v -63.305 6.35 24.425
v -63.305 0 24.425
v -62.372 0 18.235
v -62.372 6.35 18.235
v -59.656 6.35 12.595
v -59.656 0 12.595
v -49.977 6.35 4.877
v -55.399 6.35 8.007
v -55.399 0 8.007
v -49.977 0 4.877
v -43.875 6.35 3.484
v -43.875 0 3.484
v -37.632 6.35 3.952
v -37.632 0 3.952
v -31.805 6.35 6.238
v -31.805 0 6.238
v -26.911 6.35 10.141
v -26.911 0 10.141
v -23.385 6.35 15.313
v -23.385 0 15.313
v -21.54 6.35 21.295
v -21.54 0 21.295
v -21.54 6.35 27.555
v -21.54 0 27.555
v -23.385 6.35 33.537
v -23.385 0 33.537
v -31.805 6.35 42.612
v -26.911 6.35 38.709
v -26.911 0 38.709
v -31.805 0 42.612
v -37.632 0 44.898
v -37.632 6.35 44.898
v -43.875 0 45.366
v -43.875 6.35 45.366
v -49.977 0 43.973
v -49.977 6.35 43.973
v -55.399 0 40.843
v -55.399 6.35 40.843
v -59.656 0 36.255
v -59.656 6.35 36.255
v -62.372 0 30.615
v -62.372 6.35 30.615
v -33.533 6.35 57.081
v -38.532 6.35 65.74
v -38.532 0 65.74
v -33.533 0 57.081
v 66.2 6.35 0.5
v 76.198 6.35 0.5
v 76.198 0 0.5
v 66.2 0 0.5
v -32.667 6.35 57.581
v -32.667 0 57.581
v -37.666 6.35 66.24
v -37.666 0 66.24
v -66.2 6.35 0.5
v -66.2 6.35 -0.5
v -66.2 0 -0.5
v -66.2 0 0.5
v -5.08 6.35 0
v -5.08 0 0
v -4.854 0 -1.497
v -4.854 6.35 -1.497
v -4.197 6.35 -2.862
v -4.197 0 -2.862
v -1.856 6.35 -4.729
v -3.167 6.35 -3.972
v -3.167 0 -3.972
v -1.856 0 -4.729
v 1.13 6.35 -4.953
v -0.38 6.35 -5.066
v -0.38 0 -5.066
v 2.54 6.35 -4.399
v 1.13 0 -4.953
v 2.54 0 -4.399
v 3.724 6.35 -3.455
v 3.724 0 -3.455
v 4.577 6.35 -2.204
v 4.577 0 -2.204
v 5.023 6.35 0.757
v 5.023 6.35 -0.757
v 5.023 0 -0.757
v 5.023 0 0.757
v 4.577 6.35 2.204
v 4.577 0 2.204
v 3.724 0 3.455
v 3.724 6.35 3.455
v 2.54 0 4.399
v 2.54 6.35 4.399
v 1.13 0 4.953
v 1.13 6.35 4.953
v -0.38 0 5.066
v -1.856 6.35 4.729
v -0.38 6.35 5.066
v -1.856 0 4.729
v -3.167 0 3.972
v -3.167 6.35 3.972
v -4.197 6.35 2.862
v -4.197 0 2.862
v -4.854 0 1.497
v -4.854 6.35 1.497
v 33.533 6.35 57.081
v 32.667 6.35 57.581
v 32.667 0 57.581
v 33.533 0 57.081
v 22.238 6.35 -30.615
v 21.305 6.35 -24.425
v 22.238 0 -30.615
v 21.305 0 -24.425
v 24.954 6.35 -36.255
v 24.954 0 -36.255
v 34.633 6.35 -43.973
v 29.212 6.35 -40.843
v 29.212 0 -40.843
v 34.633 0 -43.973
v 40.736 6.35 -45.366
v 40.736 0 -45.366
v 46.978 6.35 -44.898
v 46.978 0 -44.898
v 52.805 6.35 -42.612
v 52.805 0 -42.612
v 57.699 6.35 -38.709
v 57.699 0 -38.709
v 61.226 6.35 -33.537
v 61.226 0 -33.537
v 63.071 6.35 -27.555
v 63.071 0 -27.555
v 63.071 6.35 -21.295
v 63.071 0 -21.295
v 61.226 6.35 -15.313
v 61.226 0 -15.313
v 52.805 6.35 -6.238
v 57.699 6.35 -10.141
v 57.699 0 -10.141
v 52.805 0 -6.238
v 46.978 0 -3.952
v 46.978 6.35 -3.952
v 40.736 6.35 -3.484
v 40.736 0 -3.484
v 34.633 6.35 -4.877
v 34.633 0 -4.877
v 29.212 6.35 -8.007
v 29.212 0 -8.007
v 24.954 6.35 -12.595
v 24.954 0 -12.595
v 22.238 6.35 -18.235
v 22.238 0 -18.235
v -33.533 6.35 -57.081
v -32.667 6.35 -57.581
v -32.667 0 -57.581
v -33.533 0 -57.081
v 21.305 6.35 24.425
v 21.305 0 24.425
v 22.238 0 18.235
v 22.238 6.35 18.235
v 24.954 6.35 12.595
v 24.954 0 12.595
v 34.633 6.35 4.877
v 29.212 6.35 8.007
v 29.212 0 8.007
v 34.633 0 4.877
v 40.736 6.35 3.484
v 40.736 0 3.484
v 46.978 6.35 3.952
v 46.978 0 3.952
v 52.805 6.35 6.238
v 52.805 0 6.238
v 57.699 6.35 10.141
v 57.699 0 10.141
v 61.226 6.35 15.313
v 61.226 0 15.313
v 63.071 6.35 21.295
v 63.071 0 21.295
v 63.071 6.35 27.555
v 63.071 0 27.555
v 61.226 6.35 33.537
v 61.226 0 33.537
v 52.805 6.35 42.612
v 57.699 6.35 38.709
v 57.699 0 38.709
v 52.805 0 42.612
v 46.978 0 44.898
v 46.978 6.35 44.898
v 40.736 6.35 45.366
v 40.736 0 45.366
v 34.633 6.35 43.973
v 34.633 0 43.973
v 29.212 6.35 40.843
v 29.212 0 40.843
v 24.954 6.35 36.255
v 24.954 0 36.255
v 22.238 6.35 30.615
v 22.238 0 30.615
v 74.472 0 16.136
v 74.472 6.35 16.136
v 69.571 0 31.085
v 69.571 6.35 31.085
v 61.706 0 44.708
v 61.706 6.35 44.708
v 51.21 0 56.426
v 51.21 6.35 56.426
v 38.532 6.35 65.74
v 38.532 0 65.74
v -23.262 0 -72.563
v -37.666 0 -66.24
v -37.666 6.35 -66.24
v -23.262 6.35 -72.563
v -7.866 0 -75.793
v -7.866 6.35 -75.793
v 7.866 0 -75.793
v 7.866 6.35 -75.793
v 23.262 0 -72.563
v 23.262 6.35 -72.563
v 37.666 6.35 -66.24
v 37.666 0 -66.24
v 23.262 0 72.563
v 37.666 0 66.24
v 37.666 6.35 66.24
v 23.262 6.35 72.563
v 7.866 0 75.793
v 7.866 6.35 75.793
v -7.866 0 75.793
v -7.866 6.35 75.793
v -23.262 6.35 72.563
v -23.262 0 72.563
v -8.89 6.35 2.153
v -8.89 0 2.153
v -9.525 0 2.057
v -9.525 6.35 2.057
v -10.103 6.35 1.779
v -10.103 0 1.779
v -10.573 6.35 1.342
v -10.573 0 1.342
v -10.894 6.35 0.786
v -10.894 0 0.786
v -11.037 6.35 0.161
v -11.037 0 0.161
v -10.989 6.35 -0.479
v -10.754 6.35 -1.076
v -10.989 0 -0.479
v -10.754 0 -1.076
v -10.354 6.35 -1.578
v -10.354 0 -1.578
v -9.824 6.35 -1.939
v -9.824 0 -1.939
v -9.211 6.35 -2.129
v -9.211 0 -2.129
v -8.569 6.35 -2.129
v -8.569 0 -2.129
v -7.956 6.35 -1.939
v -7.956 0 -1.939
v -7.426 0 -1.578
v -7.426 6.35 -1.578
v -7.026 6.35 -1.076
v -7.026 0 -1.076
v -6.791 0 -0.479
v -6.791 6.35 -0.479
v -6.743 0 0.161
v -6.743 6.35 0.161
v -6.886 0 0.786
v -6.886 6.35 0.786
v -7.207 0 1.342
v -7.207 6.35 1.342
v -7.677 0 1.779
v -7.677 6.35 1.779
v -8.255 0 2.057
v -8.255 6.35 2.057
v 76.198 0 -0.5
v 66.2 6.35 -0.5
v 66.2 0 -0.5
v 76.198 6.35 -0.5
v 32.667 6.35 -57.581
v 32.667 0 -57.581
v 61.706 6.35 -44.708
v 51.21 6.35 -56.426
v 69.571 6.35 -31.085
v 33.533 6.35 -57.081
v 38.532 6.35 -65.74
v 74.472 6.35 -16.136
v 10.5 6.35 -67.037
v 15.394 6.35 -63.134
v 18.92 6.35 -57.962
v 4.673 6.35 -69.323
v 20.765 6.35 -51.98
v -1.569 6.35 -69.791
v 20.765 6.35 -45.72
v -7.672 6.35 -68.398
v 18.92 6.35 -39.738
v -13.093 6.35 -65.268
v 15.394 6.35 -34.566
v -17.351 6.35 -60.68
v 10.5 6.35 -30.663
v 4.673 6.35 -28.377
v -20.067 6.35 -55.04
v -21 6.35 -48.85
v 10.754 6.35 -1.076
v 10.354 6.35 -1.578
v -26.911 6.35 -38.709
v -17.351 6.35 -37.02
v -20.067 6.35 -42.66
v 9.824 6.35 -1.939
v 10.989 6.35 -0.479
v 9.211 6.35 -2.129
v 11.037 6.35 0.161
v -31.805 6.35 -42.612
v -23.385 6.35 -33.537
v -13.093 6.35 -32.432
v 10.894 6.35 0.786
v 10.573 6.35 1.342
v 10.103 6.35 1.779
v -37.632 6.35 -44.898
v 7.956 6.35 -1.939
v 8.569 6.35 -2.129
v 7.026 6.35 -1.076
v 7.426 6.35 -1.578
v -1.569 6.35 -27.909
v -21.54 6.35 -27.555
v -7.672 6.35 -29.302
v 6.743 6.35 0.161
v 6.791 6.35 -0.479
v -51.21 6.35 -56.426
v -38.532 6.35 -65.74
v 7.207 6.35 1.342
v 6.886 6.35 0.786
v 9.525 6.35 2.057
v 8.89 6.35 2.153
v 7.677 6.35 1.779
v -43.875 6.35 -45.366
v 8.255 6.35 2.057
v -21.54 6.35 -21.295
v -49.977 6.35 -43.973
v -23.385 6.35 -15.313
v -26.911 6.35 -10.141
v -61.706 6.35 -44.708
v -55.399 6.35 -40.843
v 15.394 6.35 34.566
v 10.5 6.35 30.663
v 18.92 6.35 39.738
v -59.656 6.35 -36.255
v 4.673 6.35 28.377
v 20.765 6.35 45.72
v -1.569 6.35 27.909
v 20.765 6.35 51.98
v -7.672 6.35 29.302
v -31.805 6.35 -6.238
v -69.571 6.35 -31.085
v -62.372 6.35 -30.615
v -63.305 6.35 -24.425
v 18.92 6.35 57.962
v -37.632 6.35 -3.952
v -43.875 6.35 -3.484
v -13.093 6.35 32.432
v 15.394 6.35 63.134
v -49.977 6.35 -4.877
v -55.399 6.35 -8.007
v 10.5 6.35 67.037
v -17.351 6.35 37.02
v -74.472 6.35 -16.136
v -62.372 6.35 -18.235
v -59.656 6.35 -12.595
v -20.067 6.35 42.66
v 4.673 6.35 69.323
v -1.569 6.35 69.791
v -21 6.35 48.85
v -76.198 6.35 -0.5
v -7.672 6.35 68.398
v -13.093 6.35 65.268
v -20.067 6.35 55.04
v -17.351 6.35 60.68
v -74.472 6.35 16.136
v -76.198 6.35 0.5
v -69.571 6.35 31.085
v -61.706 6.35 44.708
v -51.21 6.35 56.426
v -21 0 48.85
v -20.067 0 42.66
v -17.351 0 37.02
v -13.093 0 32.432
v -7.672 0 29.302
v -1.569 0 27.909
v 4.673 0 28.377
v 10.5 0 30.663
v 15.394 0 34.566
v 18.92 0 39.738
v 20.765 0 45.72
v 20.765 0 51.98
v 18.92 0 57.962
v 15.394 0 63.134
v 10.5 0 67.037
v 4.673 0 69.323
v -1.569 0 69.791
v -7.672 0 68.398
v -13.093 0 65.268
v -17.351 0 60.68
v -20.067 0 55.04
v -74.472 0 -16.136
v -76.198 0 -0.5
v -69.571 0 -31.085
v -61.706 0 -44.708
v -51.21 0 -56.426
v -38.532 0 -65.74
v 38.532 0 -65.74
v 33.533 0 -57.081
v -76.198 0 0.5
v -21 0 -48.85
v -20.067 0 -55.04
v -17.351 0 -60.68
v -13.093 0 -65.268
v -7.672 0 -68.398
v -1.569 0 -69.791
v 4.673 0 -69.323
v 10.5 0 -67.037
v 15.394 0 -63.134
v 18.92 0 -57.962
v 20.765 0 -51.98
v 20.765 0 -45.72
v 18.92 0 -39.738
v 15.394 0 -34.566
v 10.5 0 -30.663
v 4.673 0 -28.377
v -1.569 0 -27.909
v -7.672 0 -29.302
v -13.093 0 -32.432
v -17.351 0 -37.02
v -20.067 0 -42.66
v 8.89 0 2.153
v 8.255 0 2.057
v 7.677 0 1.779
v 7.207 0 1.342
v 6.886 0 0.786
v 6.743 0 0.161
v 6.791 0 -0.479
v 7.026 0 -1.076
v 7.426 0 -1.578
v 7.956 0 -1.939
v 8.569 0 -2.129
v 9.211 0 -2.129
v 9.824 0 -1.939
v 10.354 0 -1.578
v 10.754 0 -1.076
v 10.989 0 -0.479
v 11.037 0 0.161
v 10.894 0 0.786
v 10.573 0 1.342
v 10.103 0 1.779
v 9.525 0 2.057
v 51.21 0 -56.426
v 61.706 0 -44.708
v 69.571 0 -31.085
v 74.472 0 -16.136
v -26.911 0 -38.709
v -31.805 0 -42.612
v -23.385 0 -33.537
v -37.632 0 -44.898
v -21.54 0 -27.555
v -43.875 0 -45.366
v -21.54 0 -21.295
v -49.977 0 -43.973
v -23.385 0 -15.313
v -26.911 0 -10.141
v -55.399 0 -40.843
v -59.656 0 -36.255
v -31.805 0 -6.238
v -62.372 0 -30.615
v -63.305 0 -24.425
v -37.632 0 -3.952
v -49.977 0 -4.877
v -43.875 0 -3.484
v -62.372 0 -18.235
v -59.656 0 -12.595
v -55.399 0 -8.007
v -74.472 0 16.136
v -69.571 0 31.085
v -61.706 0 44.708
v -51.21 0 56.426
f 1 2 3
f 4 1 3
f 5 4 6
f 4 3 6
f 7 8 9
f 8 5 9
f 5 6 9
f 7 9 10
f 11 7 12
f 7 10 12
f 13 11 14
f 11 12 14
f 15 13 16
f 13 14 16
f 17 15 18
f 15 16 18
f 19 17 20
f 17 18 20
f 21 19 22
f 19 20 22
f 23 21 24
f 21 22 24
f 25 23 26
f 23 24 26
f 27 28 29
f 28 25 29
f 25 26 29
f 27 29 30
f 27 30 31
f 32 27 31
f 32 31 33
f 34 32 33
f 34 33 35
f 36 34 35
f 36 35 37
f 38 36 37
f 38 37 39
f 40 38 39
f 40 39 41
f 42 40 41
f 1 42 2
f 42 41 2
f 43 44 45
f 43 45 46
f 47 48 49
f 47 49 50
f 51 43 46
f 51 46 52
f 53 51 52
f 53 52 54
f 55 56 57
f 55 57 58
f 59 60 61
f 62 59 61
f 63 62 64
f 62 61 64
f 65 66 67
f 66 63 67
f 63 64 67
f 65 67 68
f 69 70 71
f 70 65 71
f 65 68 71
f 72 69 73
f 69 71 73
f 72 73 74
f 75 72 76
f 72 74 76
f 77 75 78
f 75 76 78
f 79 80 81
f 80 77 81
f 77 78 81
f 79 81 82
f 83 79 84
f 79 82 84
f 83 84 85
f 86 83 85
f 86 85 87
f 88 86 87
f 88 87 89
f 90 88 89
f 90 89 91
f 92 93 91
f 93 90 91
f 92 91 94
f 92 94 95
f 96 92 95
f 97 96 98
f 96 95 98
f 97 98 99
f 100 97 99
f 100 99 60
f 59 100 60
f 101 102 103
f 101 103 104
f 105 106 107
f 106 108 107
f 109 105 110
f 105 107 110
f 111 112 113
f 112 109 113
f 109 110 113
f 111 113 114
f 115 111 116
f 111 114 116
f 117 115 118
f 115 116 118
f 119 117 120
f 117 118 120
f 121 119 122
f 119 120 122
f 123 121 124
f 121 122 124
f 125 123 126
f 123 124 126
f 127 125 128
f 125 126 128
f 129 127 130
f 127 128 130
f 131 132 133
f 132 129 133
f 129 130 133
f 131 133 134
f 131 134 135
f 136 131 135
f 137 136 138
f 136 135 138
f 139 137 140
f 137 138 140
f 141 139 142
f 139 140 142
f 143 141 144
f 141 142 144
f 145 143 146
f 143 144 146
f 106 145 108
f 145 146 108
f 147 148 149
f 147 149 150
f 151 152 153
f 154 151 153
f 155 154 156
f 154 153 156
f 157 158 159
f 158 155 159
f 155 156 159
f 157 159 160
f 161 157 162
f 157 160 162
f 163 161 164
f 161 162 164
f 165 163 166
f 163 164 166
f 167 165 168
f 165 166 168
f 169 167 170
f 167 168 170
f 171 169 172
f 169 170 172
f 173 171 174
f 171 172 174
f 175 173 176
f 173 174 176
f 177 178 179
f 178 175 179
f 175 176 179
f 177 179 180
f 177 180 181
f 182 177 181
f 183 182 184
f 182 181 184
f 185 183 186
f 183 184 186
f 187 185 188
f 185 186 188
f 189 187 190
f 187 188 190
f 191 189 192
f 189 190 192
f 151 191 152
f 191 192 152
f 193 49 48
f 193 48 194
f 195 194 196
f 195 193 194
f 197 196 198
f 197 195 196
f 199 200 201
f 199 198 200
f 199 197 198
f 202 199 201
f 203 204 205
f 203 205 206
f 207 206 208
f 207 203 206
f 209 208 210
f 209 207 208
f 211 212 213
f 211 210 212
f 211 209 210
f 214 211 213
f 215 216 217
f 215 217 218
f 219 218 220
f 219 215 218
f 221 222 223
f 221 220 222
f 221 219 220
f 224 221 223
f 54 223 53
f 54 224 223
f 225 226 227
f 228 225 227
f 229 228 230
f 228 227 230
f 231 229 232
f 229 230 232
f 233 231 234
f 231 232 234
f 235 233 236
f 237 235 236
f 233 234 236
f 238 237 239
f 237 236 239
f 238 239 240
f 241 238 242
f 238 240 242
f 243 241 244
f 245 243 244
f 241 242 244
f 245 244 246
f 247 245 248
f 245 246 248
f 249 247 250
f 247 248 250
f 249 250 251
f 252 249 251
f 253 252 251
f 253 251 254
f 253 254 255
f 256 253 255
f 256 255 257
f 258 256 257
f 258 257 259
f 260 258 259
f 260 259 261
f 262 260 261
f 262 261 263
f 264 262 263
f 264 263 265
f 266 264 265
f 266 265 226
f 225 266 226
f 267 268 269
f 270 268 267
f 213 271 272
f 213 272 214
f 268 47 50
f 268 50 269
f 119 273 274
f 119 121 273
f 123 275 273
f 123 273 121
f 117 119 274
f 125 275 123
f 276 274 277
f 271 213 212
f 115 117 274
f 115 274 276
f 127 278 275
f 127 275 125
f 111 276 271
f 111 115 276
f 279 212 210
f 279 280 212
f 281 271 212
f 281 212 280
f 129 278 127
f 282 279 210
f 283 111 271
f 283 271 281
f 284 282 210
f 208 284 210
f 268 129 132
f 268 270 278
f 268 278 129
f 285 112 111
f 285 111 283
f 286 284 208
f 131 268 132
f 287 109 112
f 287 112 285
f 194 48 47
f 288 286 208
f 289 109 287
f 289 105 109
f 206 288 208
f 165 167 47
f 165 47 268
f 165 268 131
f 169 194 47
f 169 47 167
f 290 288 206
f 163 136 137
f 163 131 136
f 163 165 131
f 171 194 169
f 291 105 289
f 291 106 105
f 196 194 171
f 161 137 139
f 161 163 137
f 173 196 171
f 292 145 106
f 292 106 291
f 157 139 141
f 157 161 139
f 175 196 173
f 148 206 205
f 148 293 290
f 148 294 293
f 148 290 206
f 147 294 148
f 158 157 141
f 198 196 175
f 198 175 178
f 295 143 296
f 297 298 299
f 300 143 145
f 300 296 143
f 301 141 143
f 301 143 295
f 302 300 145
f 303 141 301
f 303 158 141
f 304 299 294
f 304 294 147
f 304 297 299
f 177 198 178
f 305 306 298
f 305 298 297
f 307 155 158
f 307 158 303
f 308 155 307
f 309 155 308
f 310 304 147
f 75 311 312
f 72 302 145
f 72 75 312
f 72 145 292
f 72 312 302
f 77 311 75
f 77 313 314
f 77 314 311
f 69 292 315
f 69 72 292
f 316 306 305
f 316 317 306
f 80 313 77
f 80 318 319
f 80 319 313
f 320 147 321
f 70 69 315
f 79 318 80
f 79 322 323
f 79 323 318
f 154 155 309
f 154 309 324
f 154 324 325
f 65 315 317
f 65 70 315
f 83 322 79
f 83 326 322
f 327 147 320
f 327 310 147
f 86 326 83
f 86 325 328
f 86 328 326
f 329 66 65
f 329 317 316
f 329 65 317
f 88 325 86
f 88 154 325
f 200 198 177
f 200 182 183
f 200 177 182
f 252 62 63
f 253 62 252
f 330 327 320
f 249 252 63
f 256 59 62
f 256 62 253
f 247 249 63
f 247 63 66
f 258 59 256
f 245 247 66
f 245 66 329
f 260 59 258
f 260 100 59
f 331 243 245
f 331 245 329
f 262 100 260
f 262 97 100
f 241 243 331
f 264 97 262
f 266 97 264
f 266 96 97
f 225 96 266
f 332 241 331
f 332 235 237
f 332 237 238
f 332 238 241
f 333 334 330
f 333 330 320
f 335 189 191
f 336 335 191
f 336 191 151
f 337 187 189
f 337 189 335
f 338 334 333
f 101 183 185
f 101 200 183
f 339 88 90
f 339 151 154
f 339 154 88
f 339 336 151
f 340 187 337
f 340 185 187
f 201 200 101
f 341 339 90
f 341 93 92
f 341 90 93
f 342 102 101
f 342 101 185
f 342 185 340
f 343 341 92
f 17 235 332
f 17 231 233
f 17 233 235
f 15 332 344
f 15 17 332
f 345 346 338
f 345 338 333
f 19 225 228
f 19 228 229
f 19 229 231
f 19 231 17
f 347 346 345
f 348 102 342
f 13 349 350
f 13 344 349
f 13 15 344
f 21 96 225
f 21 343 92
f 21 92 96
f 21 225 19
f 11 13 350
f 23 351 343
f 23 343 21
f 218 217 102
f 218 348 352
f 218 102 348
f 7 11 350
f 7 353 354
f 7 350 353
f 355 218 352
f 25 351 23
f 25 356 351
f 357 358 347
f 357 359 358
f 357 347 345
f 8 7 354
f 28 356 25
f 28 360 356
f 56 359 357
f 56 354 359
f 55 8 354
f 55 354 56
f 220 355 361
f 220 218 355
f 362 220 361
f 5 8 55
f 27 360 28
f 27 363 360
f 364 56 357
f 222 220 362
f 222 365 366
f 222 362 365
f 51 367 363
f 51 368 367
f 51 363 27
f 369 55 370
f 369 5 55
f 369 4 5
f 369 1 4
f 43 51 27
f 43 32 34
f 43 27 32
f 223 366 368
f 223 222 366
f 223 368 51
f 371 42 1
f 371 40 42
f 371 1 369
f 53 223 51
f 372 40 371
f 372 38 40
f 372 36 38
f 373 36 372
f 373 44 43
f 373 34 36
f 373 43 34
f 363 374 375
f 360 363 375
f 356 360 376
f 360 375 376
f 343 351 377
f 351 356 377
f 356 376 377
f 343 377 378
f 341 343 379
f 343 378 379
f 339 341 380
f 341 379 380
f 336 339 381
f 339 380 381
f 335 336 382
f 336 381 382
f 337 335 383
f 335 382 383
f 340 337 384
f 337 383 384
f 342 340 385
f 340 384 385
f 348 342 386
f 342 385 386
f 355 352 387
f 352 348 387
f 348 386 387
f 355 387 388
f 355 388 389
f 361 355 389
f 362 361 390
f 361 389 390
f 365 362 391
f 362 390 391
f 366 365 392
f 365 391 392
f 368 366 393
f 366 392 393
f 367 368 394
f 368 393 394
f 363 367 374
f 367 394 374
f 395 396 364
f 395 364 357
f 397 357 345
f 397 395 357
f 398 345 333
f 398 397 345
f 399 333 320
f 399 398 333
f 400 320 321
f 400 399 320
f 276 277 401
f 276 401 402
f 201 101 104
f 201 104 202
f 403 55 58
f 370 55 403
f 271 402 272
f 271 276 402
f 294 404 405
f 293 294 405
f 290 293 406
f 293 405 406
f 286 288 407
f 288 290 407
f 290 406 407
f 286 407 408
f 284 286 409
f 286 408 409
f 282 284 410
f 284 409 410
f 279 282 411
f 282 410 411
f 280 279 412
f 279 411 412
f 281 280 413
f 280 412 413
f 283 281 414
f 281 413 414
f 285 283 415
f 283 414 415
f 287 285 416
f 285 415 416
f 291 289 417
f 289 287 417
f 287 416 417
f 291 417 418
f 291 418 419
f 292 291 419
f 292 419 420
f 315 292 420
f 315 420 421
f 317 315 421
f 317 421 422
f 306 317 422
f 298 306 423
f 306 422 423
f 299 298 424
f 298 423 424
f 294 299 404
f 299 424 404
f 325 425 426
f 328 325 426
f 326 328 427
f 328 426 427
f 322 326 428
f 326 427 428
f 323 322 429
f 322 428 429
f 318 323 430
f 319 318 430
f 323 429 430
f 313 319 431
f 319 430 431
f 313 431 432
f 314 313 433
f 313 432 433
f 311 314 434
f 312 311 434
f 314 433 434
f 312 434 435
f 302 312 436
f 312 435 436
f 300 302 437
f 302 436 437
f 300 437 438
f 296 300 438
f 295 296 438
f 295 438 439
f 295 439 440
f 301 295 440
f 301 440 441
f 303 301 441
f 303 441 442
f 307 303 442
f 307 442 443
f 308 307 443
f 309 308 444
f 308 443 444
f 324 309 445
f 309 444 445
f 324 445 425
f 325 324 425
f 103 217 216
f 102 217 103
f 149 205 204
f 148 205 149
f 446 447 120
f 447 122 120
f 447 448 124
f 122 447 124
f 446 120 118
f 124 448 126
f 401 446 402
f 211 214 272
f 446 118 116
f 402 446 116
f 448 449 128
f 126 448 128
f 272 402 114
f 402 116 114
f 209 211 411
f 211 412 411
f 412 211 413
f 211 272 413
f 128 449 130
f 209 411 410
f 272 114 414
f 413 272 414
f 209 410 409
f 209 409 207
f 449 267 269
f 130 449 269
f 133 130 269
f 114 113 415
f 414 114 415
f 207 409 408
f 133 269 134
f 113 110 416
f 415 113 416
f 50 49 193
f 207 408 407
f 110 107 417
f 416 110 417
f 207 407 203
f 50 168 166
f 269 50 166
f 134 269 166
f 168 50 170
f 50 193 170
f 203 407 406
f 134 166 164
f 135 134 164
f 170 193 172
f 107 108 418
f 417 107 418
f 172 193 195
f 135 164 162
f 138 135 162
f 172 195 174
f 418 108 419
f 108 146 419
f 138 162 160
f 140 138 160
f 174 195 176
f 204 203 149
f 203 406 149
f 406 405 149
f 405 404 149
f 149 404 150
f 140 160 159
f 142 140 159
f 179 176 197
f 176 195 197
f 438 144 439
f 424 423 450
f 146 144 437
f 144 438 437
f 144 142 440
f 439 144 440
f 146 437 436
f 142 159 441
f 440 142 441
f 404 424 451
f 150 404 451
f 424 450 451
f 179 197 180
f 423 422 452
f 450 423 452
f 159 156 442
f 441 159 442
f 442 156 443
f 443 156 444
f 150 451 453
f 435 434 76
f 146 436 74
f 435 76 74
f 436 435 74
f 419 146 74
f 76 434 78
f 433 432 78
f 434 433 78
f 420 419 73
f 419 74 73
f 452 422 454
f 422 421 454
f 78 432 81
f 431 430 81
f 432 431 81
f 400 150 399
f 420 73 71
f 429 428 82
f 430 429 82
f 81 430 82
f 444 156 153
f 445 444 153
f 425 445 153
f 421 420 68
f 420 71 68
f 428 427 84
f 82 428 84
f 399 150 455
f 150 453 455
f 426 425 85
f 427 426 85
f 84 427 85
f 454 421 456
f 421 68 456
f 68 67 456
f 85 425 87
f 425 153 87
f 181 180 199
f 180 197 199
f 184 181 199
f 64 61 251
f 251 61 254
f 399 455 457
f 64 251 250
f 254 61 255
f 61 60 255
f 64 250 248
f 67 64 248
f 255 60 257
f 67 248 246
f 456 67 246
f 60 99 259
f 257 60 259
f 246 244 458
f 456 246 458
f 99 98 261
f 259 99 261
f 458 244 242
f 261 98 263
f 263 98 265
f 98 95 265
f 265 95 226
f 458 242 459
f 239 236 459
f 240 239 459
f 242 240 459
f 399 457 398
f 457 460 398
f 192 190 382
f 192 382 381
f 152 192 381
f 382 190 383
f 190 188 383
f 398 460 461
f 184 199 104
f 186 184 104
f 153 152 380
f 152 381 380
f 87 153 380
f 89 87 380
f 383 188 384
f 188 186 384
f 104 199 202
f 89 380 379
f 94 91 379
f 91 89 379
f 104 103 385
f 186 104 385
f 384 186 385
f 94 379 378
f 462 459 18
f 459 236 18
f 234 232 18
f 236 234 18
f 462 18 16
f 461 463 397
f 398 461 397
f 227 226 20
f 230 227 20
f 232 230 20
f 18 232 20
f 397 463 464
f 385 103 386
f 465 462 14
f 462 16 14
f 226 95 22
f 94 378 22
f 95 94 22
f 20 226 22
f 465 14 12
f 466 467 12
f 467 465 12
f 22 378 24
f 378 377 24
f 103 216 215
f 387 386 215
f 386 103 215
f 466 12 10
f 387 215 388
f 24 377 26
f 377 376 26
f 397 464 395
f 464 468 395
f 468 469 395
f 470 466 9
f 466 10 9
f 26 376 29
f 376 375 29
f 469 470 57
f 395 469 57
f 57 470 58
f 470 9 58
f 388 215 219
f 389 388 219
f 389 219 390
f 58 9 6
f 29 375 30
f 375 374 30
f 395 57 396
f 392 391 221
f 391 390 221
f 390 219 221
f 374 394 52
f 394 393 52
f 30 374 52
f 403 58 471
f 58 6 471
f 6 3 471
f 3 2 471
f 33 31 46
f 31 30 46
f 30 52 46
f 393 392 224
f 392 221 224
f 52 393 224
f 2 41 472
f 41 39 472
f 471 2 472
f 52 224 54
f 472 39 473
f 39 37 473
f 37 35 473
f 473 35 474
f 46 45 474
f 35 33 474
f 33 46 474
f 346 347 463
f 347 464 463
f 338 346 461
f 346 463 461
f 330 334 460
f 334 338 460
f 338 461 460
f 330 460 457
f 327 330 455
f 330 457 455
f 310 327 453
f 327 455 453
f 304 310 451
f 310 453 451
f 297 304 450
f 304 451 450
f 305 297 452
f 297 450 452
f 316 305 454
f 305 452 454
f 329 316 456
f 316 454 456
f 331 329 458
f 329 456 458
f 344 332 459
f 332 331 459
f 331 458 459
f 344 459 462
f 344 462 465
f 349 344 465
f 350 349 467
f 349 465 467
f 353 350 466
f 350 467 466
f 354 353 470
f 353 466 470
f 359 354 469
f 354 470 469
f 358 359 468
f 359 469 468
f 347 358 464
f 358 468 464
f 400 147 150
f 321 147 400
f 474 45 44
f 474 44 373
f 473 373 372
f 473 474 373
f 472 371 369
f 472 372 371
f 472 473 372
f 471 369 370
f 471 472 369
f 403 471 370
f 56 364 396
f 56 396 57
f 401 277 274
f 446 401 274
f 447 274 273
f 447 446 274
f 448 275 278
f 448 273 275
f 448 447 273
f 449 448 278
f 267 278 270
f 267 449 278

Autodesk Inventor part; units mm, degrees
ref_plane "YZ Plane" through (0, 0, 0) normal (1, 0, 0) x (0, 1, 0)
ref_plane "XZ Plane" through (0, 0, 0) normal (0, 1, 0) x (-1, 0, 0)
ref_plane "XY Plane" through (0, 0, 0) normal (0, 0, 1) x (1, 0, 0)
sketch "Sketch1" plane through (0, 0, 0) normal (0, 1, 0) x (-1, 0, 0)
  circle A0 centre (0, -48.85) radius 21
  line L0 (0, -48.85) -> (0, 0) construction
  circle A1 centre (42.3053, -24.425) radius 21
  circle A2 centre (42.3053, 24.425) radius 21
  circle A3 centre (0, 48.85) radius 21
  circle A4 centre (-42.3053, 24.425) radius 21
  circle A5 centre (-42.3053, -24.425) radius 21
  circle A6 centre (0, 0) radius 76.2
  circle A7 centre (0, 0) radius 5.08
  dimension "d0" = 42
  dimension "d2" = 48.85
  dimension "d5" = 360
  dimension "d7" = 152.4
  dimension "d8" = 10.16
extrude "Extrusion1" add sketch "Sketch1" along normal blind 6.35
sketch "Sketch2" plane through (0, 6.35, 0) normal (0, 1, 0) x (1, 0, 0)
  circle A0 centre (0, 0) radius 5.08 projected
  line L0 (-8.89, 0) -> (8.89, 0) construction
  dimension "d11" = 17.78
hole "Hole1" at (-8.89, 6.35, 0) at (8.89, 6.35, 0) direction (0, -1, 0) diameter 4.3053 end through all
sketch "Sketch3" plane through (0, 6.35, 0) normal (0, 1, 0) x (1, 0, 0)
  circle A0 centre (-8.89, 0) radius 2.1526 projected
  circle A1 centre (0, 0) radius 5.08 projected
  circle A2 centre (0, 0) radius 76.2 projected
  line L0 (-32.667, 57.5809) -> (-33.533, 57.0809)
  line L1 (-33.533, 57.0809) -> (-39.803, 67.9408)
  line L2 (-39.803, 67.9408) -> (-38.937, 68.4408)
  line L3 (-38.937, 68.4408) -> (-32.667, 57.5809)
  line L4 (-33.1, 57.3309) -> (-39.37, 68.1908) construction
  line L5 (0, 0) -> (-8.89, 0) construction
  dimension "d21" = 10
  dimension "d22" = 1
  dimension "d23" = 60
  dimension "d29" = 2.54
extrude "Extrusion2" cut sketch "Sketch3" against normal through all contours L3 L0 L1 A2 | A2 L1 L2 L3 picked at (-34.8148, 60.1898)
pattern_circular "Circular Pattern1" count 6 over 360 about axis through (0, -10, 0) along (0, 1, 0) of "Extrusion2"
properties part number "carousel"
